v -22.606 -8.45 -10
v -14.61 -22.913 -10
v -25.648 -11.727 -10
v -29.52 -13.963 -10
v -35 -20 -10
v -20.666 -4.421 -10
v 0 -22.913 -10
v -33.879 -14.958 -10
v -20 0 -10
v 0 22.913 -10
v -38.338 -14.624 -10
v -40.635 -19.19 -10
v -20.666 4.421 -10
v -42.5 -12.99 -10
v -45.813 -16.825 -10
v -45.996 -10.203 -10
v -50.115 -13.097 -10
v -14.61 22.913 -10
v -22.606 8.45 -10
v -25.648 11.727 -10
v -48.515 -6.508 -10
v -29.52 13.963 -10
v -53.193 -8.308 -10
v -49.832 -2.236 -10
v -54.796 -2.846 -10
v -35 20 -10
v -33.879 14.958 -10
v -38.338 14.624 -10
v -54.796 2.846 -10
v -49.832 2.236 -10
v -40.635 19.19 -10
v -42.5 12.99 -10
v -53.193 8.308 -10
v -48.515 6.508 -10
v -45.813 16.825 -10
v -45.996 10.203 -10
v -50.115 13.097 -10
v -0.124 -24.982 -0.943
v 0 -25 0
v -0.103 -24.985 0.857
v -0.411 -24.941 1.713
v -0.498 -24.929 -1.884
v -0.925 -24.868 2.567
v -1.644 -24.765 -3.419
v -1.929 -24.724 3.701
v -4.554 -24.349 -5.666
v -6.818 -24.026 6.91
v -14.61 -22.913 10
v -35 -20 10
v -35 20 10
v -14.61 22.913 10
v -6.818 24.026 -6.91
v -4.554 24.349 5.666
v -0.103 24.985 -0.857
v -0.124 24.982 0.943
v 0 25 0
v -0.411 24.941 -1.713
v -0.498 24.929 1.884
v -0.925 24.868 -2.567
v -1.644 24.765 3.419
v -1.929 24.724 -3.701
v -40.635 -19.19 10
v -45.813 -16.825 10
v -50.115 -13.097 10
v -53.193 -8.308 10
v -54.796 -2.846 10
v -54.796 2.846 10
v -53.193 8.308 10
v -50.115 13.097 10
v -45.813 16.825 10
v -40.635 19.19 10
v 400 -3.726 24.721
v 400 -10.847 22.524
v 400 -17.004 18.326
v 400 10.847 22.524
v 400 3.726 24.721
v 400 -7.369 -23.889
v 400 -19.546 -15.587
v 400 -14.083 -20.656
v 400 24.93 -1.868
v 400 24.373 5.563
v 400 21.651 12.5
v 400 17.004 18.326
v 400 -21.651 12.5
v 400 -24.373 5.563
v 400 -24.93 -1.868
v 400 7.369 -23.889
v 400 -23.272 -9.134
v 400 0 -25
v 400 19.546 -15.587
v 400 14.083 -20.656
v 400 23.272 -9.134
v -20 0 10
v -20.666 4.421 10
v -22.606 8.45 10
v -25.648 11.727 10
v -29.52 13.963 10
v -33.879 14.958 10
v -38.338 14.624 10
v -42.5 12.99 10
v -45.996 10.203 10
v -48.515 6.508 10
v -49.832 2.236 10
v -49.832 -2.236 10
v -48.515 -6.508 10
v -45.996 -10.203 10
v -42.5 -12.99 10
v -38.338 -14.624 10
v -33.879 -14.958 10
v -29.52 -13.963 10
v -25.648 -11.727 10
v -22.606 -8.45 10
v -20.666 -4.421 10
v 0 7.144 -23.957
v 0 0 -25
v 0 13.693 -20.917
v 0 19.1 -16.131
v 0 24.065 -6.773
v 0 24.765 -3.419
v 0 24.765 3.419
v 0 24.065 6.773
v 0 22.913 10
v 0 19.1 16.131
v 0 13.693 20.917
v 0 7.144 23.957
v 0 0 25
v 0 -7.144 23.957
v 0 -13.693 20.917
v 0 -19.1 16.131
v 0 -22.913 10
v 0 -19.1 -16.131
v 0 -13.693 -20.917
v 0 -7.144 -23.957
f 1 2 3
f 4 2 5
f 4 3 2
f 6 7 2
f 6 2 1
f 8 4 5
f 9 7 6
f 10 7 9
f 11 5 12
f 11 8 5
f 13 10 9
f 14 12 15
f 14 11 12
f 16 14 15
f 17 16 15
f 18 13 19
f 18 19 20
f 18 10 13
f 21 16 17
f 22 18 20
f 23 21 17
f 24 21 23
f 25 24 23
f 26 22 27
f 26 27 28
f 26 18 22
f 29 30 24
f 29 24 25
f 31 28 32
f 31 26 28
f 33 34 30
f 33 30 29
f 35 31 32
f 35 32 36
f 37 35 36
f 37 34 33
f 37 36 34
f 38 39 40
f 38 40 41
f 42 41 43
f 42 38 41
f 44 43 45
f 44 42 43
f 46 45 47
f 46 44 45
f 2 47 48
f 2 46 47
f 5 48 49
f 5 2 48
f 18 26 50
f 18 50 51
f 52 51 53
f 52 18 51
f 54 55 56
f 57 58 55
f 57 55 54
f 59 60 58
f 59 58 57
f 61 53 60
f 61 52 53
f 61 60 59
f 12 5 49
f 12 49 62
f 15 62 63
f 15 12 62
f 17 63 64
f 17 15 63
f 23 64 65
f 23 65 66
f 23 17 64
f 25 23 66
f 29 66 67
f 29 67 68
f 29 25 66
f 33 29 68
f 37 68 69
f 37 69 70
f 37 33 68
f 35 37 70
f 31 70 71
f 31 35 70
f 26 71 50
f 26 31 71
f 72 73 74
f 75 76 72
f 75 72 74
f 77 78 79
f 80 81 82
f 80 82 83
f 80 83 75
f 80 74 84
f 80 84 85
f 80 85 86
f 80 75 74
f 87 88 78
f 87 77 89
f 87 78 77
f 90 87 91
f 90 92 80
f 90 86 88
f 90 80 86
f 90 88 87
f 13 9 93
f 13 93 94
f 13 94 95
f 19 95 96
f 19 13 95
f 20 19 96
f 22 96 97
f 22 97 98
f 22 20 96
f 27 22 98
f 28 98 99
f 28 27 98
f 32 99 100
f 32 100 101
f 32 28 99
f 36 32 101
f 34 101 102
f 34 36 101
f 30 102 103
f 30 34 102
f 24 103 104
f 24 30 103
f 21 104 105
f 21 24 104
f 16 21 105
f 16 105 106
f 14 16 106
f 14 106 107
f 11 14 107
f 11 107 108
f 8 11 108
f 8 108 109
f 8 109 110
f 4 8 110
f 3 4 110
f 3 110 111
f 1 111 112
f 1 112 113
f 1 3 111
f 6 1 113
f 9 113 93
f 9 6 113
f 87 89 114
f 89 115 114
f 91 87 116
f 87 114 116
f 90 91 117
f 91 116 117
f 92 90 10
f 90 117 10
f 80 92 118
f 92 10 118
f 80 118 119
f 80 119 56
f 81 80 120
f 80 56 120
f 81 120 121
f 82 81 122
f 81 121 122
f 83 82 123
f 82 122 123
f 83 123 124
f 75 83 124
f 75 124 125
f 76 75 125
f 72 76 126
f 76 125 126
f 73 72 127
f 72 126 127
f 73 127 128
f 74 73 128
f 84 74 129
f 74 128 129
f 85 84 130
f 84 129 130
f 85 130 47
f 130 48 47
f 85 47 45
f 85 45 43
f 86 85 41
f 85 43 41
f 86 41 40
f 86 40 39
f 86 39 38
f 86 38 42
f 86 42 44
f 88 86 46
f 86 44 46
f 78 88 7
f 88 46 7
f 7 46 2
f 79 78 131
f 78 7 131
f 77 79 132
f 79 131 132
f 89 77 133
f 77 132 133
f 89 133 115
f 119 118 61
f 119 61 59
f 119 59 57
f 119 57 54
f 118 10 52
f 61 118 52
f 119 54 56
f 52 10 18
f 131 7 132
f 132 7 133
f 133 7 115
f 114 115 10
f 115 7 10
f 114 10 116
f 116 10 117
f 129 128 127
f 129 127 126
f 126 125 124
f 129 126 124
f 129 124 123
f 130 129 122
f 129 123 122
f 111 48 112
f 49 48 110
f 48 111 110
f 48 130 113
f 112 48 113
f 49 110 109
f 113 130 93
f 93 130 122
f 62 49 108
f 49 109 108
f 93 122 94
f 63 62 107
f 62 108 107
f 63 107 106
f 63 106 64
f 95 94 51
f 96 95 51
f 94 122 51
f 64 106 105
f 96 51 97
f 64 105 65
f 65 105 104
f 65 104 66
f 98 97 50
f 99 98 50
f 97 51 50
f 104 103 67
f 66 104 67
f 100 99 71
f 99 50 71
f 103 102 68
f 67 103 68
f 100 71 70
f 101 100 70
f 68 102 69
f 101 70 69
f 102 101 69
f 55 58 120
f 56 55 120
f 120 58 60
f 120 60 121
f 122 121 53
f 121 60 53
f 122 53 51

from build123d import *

# Parameters (mm, degrees)
SKETCH1_R                = 25
BOSS_EXTRUDE1_DEPTH      = 400
BOSS_EXTRUDE2_DEPTH      = 10
BOSS_EXTRUDE2_DEPTH_BACK = 10
SKETCH2_R                = 15
CUT_EXTRUDE1_START       = -70
SKETCH3_R                = 32.241288232
SKETCH3_R_2              = 25
CUT_EXTRUDE1_DEPTH       = 70


with BuildPart() as part:
    # Sketch1 → Boss-Extrude1 (new body)
    with BuildSketch(Plane(origin=(0, 0, 0), x_dir=(0, 0, -1), z_dir=(1, 0, 0))):
        Circle(SKETCH1_R)
    extrude(amount=BOSS_EXTRUDE1_DEPTH)

    # Sketch2 → Boss-Extrude2 (add, two sides: drawn at the far end of the back side and taken through both)
    with BuildSketch(Plane.XY.offset(-BOSS_EXTRUDE2_DEPTH_BACK)):
        with BuildLine():
            Line((0, 25), (0, -25))
            Line((0, -25), (-35, -20))
            ThreePointArc((-35, -20), (-55, 0), (-35, 20))
            Line((-35, 20), (0, 25))
        make_face()
        with Locations((-35, 0)):
            Circle(SKETCH2_R, mode=Mode.SUBTRACT)
    extrude(amount=BOSS_EXTRUDE2_DEPTH + BOSS_EXTRUDE2_DEPTH_BACK)

    # Sketch3 → Cut-Extrude1 (cut)
    with BuildSketch(Plane(origin=(0, 0, 0), x_dir=(0, 0, -1), z_dir=(1, 0, 0)).offset(CUT_EXTRUDE1_START)):
        Circle(SKETCH3_R)
        Circle(SKETCH3_R_2, mode=Mode.SUBTRACT)
    extrude(amount=CUT_EXTRUDE1_DEPTH, mode=Mode.SUBTRACT)


solid = part.part
